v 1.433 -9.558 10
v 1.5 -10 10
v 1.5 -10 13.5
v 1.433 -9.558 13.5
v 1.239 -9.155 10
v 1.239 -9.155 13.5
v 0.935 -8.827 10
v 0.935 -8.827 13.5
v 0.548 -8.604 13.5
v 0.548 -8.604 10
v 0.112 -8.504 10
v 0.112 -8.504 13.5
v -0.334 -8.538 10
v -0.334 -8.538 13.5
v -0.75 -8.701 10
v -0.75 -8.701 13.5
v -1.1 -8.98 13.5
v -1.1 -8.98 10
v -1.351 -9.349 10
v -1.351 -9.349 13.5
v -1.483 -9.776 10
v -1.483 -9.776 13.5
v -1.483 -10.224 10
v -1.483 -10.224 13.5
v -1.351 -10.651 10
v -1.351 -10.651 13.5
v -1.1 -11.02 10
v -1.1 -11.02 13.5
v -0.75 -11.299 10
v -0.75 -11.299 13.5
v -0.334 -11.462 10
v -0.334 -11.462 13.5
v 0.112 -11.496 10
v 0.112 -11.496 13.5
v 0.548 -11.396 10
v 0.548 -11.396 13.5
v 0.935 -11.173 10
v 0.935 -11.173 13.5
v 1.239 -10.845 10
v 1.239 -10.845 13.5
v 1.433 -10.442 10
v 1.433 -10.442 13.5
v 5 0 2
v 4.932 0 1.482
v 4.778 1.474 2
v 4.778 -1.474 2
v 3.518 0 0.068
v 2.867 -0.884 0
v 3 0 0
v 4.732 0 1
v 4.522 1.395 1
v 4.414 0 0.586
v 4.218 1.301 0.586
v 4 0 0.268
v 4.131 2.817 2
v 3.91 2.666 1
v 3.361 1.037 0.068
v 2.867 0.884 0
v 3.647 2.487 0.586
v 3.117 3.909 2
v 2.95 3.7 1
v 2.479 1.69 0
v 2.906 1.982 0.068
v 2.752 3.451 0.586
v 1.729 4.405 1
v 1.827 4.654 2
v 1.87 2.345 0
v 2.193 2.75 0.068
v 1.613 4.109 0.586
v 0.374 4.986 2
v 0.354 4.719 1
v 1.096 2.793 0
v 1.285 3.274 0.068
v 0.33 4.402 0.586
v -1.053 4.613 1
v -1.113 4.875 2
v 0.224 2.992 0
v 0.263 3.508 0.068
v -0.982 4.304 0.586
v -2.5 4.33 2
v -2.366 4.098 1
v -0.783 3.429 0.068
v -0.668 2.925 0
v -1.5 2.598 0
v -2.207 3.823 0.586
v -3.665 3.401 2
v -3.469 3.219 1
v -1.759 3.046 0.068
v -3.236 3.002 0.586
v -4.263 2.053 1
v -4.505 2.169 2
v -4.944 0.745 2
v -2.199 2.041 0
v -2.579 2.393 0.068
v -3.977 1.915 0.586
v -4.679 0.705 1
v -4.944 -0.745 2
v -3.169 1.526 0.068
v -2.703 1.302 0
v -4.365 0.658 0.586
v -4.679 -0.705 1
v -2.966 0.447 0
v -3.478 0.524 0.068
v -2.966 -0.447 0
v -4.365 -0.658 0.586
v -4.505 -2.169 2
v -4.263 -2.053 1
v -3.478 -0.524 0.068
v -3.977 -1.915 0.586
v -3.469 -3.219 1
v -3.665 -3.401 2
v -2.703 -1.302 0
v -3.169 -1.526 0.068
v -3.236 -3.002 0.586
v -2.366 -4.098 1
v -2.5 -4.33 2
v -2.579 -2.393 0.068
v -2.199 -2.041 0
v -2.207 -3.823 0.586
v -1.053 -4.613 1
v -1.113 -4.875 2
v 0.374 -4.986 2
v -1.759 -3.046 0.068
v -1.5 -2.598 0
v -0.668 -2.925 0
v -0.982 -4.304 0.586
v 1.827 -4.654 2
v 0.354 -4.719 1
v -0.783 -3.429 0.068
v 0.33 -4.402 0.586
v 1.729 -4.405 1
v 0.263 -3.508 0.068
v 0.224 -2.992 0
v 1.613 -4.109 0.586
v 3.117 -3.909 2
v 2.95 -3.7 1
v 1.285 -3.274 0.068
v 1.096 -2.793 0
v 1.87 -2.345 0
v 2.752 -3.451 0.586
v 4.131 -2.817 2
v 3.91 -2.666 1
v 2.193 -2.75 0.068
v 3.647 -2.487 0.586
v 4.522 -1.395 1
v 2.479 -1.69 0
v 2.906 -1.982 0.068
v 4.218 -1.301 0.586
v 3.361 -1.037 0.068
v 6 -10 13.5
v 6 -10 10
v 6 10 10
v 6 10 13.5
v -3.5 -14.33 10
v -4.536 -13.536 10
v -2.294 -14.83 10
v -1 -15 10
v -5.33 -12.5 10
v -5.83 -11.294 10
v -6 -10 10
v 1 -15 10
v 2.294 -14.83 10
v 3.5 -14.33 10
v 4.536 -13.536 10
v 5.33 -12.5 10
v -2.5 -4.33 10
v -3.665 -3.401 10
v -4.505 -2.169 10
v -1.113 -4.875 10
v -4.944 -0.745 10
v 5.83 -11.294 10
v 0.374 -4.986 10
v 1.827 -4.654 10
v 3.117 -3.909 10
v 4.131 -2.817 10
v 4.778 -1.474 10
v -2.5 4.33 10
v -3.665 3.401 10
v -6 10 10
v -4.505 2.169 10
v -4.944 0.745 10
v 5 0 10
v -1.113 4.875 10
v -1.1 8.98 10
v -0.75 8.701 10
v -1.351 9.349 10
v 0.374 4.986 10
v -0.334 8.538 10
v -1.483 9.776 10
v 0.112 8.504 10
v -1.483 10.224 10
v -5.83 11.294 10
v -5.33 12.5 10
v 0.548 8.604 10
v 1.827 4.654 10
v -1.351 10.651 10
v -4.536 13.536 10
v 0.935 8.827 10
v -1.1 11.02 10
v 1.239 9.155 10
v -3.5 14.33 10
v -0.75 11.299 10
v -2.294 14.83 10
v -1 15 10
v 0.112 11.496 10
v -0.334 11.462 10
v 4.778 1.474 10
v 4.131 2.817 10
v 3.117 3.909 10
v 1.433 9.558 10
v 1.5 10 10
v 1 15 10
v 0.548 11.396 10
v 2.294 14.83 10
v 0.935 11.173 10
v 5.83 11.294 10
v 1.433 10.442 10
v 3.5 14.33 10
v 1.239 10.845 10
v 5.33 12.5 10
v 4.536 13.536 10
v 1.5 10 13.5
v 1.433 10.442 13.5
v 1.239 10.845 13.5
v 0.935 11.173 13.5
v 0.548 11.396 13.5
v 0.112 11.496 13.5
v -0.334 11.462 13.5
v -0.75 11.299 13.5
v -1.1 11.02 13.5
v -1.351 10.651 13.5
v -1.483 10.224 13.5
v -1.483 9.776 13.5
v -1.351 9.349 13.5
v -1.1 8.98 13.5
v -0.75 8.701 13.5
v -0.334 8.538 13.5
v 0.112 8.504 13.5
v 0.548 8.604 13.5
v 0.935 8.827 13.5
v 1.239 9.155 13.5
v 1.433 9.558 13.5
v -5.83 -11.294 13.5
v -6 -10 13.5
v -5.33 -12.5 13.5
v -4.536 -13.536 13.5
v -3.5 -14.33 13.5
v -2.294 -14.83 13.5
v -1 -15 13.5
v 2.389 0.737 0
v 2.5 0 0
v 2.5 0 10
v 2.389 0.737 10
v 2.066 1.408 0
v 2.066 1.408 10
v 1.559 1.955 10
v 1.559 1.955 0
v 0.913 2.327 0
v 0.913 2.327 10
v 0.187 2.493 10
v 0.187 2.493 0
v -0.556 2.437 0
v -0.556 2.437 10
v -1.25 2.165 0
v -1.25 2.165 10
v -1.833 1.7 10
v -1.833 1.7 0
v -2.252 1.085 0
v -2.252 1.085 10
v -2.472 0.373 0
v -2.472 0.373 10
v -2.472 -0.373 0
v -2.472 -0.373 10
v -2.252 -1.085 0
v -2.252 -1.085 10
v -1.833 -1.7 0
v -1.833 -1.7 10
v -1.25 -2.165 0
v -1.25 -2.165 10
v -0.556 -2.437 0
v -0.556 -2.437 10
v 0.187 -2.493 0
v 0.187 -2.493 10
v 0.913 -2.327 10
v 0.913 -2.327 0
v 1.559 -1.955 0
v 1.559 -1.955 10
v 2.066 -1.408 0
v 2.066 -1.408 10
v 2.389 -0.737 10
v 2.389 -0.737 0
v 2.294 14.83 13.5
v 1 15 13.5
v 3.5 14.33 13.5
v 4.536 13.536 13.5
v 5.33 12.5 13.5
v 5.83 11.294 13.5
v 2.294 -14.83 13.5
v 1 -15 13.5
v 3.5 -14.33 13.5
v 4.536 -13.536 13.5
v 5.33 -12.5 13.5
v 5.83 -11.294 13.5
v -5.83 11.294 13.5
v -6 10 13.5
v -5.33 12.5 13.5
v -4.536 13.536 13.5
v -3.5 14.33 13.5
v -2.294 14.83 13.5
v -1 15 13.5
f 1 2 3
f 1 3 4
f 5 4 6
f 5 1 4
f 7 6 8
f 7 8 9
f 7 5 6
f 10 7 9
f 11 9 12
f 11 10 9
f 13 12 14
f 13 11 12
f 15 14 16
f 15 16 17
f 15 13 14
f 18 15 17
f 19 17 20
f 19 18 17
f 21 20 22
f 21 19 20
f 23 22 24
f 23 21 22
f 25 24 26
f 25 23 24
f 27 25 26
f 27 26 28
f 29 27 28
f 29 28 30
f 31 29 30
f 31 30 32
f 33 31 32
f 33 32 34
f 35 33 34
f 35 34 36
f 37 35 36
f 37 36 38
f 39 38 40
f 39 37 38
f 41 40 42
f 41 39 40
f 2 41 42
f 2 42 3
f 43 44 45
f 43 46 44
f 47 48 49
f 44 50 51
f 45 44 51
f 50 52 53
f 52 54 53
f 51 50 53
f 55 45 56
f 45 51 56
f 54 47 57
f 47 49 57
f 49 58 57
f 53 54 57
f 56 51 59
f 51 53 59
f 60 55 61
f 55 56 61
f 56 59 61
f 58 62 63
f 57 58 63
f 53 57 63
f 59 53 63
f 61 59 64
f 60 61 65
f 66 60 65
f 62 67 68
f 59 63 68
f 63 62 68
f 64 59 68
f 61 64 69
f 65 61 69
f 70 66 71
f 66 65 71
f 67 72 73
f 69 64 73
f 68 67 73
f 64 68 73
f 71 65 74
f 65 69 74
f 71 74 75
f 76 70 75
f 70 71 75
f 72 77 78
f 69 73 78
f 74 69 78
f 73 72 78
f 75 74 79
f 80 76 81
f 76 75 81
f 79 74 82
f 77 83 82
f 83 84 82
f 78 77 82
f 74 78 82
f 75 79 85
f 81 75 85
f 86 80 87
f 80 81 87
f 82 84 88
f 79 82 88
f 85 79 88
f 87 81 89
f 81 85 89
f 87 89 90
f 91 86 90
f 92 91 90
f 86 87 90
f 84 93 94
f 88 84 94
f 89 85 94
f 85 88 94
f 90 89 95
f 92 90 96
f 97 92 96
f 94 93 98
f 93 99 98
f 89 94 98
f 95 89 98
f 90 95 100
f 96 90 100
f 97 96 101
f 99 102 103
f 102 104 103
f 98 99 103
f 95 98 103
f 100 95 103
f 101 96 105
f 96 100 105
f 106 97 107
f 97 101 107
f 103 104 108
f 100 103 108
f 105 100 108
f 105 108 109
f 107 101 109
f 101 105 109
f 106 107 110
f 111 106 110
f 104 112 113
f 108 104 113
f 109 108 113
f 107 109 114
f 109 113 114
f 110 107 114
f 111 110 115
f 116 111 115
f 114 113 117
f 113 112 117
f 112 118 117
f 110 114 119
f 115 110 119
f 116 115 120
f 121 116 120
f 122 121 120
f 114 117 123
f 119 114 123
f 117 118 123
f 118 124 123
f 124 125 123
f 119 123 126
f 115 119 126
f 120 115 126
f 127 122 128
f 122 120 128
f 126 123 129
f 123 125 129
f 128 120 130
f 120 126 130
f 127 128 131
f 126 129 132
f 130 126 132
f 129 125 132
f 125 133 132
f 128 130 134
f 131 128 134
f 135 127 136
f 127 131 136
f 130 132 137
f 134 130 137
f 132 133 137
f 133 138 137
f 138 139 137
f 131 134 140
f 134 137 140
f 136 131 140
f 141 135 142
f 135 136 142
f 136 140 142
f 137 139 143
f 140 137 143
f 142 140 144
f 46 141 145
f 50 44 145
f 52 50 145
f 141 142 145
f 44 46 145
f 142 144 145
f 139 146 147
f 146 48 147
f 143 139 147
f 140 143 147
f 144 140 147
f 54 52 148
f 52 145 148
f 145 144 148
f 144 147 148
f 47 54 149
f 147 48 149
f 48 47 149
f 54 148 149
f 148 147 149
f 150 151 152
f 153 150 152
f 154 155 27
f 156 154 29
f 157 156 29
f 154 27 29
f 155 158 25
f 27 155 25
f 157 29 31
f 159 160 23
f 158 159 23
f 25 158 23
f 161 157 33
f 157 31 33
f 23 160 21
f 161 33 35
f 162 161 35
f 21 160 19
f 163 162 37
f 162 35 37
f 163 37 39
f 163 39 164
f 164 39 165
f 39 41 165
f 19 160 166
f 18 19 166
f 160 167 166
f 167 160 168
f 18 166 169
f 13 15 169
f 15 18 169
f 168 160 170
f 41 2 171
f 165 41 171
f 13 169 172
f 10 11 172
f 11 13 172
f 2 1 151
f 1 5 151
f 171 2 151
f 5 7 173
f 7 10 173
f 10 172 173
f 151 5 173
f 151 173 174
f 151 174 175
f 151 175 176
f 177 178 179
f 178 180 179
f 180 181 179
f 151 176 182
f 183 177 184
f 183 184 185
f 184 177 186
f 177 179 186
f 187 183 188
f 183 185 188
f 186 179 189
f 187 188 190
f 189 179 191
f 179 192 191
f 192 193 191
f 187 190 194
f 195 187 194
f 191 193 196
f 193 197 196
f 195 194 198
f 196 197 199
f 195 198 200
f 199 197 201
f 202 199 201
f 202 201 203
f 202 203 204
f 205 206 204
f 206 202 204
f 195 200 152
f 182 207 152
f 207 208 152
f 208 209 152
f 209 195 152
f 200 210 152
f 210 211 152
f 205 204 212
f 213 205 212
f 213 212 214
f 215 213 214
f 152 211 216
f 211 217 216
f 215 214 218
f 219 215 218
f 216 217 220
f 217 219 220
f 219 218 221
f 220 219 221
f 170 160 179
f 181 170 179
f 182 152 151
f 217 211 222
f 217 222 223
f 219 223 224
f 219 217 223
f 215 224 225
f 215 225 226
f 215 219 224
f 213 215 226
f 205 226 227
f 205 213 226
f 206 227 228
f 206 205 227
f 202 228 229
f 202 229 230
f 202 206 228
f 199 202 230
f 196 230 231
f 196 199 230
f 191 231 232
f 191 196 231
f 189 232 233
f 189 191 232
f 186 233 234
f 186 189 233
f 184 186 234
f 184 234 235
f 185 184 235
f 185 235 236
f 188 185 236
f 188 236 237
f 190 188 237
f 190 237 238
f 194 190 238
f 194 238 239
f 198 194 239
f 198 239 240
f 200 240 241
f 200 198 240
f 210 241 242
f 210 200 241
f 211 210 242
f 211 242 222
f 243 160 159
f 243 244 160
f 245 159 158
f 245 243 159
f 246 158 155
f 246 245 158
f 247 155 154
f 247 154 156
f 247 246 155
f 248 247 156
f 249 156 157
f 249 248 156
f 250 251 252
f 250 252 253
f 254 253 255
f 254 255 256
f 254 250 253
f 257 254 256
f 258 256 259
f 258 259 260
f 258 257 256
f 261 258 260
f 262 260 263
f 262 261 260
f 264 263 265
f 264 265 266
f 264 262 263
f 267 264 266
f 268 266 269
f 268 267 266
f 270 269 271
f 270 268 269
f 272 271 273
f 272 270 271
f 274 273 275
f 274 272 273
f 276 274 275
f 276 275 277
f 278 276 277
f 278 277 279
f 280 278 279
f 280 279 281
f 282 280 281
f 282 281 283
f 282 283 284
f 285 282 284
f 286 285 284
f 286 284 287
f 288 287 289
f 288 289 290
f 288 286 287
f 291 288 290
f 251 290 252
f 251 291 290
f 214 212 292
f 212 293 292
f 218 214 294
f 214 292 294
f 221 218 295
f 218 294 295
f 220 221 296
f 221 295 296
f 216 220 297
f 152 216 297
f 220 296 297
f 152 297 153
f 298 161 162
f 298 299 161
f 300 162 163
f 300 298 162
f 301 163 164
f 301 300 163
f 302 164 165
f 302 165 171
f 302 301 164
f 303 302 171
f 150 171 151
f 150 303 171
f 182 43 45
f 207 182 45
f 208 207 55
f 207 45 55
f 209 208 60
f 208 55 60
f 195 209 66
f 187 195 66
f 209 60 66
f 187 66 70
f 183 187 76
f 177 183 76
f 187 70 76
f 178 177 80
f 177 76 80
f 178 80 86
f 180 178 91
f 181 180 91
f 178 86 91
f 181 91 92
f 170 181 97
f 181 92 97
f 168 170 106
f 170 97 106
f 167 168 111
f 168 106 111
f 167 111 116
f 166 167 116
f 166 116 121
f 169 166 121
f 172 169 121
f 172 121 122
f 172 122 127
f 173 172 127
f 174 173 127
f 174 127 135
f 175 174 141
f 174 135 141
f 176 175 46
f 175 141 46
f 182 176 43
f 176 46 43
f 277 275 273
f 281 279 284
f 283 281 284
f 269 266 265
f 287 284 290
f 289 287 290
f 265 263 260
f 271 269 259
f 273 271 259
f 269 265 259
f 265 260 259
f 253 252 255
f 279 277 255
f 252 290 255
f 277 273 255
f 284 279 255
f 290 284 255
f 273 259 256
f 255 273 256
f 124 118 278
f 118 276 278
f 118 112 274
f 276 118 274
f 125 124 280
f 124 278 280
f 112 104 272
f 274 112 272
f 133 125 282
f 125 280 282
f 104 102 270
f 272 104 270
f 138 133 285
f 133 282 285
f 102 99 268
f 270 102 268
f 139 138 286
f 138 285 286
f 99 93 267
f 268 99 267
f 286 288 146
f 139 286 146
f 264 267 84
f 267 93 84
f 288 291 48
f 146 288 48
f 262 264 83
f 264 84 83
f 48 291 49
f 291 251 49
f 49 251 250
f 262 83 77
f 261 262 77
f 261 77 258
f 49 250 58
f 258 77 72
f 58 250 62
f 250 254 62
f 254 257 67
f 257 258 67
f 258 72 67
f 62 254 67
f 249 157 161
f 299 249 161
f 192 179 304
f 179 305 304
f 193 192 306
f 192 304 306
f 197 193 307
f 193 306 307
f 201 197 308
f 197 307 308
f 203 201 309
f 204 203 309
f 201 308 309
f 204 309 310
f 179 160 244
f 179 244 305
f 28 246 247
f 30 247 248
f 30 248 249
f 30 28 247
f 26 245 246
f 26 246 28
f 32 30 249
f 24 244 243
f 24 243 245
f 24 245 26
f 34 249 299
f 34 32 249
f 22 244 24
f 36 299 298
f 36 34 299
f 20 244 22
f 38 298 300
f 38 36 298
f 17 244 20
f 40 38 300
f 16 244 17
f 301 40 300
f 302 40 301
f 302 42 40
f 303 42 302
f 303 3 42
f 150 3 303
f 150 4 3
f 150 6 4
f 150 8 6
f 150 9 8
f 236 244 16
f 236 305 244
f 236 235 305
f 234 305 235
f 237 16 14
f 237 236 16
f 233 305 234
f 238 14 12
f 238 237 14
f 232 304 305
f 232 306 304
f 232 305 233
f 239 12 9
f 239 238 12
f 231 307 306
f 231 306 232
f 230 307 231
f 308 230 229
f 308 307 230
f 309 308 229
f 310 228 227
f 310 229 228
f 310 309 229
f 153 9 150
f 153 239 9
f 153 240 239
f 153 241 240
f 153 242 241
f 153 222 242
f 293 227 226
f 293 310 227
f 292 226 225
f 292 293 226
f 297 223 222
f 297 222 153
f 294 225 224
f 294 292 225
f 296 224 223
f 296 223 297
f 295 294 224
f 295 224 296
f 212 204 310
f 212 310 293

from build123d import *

# Parameters (mm, degrees)
F0_R     = 5
F0_R_2   = 2.5
F1_DEPTH = 10
F2_W     = 12
F2_H     = 30
F2_R     = 1.5
F3_DEPTH = 3.5
F4_R     = 5
F5_R     = 2


with BuildPart() as f1:
    # F0 (on Top) → F1 (new body)
    with BuildSketch(Plane.XY):
        Circle(F0_R)
        Circle(F0_R_2, mode=Mode.SUBTRACT)
    extrude(amount=F1_DEPTH)

    # F2 (on face) → F3 (join)
    with BuildSketch(Plane.XY.offset(10)):
        Rectangle(F2_W, F2_H)
        with Locations((0, -10)):
            Circle(F2_R, mode=Mode.SUBTRACT)
        with Locations((0, 10)):
            Circle(F2_R, mode=Mode.SUBTRACT)
    extrude(amount=F3_DEPTH)

    # F4
    f4_edges = [f1.edges().sort_by_distance(p)[0] for p in [
        (6, 15, 11.75),
        (-6, 15, 11.75),
        (-6, -15, 11.75),
        (6, -15, 11.75),
    ]]
    fillet(f4_edges, radius=F4_R)

    # F5
    f5_edges = [f1.edges().sort_by_distance(p)[0] for p in [
        (-5, 0, 0),
    ]]
    fillet(f5_edges, radius=F5_R)


solid = f1.part
